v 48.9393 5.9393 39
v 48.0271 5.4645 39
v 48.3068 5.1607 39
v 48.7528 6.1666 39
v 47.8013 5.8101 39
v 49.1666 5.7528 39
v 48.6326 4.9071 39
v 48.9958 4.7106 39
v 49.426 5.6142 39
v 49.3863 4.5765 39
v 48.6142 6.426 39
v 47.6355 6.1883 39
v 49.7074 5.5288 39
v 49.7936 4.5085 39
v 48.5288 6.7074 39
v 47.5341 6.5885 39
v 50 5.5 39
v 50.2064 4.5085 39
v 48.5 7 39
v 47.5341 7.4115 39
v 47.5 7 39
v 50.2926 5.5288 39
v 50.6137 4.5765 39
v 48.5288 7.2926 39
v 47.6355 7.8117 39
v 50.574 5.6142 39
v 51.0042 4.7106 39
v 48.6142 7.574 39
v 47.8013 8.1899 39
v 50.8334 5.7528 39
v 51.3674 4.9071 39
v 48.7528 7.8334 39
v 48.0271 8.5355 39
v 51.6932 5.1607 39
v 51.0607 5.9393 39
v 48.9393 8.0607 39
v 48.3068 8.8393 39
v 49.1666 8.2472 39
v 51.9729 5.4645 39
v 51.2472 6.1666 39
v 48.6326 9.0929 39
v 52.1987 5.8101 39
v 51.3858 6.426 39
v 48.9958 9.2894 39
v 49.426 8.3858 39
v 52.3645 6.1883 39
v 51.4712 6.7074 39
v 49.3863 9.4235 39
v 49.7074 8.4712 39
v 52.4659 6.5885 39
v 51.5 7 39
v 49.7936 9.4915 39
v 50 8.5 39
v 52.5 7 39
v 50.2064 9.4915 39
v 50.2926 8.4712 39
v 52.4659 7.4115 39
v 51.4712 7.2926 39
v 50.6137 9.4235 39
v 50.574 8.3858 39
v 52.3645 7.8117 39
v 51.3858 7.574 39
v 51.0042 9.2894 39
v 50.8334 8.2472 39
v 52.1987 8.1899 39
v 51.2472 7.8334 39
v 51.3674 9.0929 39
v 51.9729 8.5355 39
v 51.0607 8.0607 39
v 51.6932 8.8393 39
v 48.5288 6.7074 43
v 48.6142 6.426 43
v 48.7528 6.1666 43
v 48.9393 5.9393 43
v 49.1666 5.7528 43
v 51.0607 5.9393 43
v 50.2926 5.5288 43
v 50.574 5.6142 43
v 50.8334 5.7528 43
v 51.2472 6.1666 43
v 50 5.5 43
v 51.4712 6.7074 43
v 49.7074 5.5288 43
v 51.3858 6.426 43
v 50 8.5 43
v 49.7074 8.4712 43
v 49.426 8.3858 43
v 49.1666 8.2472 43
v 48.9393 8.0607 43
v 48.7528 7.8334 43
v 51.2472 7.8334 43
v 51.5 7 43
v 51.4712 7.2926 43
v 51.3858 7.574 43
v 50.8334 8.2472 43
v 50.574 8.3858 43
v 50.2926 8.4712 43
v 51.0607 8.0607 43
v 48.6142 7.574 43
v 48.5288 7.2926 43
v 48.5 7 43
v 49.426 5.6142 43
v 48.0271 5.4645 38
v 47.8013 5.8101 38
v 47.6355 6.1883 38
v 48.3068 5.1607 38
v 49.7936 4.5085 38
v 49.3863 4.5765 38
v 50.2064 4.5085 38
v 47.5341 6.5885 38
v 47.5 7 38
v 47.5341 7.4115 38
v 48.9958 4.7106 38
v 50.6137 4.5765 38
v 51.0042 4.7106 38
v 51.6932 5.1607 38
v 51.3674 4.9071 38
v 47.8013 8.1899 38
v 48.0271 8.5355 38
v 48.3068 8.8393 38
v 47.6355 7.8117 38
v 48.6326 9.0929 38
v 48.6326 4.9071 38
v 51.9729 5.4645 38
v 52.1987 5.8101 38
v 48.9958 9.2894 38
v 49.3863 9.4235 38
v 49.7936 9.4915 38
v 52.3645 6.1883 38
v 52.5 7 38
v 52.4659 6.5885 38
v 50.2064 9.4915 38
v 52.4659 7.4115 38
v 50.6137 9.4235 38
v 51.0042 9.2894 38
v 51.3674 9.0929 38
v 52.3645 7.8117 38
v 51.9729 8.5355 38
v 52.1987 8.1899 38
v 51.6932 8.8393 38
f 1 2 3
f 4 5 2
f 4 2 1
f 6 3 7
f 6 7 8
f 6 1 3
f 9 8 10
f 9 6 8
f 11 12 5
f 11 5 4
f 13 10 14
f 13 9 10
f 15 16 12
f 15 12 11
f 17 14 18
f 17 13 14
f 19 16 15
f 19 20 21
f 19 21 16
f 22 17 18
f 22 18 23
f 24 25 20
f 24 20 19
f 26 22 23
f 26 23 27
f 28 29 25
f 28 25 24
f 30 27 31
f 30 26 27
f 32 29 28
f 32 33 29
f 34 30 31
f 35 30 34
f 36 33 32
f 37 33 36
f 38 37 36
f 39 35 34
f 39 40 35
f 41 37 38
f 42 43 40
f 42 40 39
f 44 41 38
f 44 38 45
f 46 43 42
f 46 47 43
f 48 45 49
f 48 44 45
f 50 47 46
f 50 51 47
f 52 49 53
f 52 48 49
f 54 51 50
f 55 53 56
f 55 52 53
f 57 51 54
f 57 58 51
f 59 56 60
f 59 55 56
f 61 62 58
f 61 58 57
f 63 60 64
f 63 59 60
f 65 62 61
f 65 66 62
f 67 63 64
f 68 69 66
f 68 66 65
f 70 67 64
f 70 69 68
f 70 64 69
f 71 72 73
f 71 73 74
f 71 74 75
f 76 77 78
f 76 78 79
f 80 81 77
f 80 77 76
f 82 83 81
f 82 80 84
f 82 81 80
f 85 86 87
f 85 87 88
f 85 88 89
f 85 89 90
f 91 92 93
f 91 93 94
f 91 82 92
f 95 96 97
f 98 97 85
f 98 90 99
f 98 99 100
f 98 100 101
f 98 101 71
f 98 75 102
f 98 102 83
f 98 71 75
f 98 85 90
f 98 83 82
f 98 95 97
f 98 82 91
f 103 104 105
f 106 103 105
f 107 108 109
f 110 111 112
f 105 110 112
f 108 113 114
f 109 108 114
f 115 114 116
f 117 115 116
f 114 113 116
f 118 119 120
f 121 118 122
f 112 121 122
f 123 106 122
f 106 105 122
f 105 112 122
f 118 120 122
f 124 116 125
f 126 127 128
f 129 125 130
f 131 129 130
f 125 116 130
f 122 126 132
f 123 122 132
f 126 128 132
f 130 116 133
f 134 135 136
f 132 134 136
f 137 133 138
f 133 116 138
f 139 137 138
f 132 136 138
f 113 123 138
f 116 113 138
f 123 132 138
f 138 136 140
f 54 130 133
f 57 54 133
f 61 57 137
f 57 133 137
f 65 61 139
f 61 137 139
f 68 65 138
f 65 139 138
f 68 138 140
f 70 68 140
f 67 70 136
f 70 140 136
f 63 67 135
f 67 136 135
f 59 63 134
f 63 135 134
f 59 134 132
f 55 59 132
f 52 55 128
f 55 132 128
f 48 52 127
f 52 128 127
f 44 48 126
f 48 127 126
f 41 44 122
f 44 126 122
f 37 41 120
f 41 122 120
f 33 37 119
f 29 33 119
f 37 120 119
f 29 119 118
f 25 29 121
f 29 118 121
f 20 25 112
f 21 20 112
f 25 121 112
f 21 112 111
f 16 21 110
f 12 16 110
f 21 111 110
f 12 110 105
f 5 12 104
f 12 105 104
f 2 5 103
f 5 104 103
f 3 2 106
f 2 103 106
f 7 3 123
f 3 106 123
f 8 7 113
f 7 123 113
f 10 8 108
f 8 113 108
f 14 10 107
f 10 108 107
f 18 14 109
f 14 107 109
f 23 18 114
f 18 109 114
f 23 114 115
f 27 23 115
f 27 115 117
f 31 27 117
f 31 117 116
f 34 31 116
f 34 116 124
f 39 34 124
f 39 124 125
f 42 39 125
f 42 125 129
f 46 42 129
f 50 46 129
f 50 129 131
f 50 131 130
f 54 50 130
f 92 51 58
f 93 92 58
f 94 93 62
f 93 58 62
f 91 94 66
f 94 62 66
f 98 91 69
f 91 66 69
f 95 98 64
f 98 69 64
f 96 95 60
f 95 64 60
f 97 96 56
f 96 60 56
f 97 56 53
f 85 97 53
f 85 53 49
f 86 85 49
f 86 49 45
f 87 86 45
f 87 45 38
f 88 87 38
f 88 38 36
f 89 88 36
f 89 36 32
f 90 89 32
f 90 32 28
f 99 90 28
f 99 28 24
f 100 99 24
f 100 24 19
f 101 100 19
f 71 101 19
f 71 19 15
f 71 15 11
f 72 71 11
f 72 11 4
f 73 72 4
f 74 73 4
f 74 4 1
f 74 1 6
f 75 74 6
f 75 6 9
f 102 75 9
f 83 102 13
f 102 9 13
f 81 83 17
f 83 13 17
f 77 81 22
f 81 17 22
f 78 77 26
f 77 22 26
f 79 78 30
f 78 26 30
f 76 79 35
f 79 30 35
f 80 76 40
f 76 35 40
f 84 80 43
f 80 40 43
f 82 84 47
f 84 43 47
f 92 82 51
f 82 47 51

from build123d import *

# Parameters (mm, degrees)
CYLINDER014_R     = 2.5
CYLINDER014_DEPTH = 1
CYLINDER013_R     = 1.5
CYLINDER013_DEPTH = 5


with BuildPart() as button_base:
    # Cylinder014 → Cylinder014 (new body)
    with BuildSketch(Plane(origin=(50, 7, 37), x_dir=(1, 0, 0), z_dir=(0, 0, 1))):
        Circle(CYLINDER014_R)
    extrude(amount=CYLINDER014_DEPTH)


with BuildPart() as button001:
    # Cylinder013 → Cylinder013 (new body)
    with BuildSketch(Plane(origin=(50, 7, 37), x_dir=(1, 0, 0), z_dir=(0, 0, 1))):
        Circle(CYLINDER013_R)
    extrude(amount=CYLINDER013_DEPTH)

    # Fusion009: union button_base
    add(button_base.part)


with BuildPart() as button001_1:
    # Fusion009 placement: moved
    add(button001.part.moved(Location((0, 0, 1))))


solid = button001_1.part
